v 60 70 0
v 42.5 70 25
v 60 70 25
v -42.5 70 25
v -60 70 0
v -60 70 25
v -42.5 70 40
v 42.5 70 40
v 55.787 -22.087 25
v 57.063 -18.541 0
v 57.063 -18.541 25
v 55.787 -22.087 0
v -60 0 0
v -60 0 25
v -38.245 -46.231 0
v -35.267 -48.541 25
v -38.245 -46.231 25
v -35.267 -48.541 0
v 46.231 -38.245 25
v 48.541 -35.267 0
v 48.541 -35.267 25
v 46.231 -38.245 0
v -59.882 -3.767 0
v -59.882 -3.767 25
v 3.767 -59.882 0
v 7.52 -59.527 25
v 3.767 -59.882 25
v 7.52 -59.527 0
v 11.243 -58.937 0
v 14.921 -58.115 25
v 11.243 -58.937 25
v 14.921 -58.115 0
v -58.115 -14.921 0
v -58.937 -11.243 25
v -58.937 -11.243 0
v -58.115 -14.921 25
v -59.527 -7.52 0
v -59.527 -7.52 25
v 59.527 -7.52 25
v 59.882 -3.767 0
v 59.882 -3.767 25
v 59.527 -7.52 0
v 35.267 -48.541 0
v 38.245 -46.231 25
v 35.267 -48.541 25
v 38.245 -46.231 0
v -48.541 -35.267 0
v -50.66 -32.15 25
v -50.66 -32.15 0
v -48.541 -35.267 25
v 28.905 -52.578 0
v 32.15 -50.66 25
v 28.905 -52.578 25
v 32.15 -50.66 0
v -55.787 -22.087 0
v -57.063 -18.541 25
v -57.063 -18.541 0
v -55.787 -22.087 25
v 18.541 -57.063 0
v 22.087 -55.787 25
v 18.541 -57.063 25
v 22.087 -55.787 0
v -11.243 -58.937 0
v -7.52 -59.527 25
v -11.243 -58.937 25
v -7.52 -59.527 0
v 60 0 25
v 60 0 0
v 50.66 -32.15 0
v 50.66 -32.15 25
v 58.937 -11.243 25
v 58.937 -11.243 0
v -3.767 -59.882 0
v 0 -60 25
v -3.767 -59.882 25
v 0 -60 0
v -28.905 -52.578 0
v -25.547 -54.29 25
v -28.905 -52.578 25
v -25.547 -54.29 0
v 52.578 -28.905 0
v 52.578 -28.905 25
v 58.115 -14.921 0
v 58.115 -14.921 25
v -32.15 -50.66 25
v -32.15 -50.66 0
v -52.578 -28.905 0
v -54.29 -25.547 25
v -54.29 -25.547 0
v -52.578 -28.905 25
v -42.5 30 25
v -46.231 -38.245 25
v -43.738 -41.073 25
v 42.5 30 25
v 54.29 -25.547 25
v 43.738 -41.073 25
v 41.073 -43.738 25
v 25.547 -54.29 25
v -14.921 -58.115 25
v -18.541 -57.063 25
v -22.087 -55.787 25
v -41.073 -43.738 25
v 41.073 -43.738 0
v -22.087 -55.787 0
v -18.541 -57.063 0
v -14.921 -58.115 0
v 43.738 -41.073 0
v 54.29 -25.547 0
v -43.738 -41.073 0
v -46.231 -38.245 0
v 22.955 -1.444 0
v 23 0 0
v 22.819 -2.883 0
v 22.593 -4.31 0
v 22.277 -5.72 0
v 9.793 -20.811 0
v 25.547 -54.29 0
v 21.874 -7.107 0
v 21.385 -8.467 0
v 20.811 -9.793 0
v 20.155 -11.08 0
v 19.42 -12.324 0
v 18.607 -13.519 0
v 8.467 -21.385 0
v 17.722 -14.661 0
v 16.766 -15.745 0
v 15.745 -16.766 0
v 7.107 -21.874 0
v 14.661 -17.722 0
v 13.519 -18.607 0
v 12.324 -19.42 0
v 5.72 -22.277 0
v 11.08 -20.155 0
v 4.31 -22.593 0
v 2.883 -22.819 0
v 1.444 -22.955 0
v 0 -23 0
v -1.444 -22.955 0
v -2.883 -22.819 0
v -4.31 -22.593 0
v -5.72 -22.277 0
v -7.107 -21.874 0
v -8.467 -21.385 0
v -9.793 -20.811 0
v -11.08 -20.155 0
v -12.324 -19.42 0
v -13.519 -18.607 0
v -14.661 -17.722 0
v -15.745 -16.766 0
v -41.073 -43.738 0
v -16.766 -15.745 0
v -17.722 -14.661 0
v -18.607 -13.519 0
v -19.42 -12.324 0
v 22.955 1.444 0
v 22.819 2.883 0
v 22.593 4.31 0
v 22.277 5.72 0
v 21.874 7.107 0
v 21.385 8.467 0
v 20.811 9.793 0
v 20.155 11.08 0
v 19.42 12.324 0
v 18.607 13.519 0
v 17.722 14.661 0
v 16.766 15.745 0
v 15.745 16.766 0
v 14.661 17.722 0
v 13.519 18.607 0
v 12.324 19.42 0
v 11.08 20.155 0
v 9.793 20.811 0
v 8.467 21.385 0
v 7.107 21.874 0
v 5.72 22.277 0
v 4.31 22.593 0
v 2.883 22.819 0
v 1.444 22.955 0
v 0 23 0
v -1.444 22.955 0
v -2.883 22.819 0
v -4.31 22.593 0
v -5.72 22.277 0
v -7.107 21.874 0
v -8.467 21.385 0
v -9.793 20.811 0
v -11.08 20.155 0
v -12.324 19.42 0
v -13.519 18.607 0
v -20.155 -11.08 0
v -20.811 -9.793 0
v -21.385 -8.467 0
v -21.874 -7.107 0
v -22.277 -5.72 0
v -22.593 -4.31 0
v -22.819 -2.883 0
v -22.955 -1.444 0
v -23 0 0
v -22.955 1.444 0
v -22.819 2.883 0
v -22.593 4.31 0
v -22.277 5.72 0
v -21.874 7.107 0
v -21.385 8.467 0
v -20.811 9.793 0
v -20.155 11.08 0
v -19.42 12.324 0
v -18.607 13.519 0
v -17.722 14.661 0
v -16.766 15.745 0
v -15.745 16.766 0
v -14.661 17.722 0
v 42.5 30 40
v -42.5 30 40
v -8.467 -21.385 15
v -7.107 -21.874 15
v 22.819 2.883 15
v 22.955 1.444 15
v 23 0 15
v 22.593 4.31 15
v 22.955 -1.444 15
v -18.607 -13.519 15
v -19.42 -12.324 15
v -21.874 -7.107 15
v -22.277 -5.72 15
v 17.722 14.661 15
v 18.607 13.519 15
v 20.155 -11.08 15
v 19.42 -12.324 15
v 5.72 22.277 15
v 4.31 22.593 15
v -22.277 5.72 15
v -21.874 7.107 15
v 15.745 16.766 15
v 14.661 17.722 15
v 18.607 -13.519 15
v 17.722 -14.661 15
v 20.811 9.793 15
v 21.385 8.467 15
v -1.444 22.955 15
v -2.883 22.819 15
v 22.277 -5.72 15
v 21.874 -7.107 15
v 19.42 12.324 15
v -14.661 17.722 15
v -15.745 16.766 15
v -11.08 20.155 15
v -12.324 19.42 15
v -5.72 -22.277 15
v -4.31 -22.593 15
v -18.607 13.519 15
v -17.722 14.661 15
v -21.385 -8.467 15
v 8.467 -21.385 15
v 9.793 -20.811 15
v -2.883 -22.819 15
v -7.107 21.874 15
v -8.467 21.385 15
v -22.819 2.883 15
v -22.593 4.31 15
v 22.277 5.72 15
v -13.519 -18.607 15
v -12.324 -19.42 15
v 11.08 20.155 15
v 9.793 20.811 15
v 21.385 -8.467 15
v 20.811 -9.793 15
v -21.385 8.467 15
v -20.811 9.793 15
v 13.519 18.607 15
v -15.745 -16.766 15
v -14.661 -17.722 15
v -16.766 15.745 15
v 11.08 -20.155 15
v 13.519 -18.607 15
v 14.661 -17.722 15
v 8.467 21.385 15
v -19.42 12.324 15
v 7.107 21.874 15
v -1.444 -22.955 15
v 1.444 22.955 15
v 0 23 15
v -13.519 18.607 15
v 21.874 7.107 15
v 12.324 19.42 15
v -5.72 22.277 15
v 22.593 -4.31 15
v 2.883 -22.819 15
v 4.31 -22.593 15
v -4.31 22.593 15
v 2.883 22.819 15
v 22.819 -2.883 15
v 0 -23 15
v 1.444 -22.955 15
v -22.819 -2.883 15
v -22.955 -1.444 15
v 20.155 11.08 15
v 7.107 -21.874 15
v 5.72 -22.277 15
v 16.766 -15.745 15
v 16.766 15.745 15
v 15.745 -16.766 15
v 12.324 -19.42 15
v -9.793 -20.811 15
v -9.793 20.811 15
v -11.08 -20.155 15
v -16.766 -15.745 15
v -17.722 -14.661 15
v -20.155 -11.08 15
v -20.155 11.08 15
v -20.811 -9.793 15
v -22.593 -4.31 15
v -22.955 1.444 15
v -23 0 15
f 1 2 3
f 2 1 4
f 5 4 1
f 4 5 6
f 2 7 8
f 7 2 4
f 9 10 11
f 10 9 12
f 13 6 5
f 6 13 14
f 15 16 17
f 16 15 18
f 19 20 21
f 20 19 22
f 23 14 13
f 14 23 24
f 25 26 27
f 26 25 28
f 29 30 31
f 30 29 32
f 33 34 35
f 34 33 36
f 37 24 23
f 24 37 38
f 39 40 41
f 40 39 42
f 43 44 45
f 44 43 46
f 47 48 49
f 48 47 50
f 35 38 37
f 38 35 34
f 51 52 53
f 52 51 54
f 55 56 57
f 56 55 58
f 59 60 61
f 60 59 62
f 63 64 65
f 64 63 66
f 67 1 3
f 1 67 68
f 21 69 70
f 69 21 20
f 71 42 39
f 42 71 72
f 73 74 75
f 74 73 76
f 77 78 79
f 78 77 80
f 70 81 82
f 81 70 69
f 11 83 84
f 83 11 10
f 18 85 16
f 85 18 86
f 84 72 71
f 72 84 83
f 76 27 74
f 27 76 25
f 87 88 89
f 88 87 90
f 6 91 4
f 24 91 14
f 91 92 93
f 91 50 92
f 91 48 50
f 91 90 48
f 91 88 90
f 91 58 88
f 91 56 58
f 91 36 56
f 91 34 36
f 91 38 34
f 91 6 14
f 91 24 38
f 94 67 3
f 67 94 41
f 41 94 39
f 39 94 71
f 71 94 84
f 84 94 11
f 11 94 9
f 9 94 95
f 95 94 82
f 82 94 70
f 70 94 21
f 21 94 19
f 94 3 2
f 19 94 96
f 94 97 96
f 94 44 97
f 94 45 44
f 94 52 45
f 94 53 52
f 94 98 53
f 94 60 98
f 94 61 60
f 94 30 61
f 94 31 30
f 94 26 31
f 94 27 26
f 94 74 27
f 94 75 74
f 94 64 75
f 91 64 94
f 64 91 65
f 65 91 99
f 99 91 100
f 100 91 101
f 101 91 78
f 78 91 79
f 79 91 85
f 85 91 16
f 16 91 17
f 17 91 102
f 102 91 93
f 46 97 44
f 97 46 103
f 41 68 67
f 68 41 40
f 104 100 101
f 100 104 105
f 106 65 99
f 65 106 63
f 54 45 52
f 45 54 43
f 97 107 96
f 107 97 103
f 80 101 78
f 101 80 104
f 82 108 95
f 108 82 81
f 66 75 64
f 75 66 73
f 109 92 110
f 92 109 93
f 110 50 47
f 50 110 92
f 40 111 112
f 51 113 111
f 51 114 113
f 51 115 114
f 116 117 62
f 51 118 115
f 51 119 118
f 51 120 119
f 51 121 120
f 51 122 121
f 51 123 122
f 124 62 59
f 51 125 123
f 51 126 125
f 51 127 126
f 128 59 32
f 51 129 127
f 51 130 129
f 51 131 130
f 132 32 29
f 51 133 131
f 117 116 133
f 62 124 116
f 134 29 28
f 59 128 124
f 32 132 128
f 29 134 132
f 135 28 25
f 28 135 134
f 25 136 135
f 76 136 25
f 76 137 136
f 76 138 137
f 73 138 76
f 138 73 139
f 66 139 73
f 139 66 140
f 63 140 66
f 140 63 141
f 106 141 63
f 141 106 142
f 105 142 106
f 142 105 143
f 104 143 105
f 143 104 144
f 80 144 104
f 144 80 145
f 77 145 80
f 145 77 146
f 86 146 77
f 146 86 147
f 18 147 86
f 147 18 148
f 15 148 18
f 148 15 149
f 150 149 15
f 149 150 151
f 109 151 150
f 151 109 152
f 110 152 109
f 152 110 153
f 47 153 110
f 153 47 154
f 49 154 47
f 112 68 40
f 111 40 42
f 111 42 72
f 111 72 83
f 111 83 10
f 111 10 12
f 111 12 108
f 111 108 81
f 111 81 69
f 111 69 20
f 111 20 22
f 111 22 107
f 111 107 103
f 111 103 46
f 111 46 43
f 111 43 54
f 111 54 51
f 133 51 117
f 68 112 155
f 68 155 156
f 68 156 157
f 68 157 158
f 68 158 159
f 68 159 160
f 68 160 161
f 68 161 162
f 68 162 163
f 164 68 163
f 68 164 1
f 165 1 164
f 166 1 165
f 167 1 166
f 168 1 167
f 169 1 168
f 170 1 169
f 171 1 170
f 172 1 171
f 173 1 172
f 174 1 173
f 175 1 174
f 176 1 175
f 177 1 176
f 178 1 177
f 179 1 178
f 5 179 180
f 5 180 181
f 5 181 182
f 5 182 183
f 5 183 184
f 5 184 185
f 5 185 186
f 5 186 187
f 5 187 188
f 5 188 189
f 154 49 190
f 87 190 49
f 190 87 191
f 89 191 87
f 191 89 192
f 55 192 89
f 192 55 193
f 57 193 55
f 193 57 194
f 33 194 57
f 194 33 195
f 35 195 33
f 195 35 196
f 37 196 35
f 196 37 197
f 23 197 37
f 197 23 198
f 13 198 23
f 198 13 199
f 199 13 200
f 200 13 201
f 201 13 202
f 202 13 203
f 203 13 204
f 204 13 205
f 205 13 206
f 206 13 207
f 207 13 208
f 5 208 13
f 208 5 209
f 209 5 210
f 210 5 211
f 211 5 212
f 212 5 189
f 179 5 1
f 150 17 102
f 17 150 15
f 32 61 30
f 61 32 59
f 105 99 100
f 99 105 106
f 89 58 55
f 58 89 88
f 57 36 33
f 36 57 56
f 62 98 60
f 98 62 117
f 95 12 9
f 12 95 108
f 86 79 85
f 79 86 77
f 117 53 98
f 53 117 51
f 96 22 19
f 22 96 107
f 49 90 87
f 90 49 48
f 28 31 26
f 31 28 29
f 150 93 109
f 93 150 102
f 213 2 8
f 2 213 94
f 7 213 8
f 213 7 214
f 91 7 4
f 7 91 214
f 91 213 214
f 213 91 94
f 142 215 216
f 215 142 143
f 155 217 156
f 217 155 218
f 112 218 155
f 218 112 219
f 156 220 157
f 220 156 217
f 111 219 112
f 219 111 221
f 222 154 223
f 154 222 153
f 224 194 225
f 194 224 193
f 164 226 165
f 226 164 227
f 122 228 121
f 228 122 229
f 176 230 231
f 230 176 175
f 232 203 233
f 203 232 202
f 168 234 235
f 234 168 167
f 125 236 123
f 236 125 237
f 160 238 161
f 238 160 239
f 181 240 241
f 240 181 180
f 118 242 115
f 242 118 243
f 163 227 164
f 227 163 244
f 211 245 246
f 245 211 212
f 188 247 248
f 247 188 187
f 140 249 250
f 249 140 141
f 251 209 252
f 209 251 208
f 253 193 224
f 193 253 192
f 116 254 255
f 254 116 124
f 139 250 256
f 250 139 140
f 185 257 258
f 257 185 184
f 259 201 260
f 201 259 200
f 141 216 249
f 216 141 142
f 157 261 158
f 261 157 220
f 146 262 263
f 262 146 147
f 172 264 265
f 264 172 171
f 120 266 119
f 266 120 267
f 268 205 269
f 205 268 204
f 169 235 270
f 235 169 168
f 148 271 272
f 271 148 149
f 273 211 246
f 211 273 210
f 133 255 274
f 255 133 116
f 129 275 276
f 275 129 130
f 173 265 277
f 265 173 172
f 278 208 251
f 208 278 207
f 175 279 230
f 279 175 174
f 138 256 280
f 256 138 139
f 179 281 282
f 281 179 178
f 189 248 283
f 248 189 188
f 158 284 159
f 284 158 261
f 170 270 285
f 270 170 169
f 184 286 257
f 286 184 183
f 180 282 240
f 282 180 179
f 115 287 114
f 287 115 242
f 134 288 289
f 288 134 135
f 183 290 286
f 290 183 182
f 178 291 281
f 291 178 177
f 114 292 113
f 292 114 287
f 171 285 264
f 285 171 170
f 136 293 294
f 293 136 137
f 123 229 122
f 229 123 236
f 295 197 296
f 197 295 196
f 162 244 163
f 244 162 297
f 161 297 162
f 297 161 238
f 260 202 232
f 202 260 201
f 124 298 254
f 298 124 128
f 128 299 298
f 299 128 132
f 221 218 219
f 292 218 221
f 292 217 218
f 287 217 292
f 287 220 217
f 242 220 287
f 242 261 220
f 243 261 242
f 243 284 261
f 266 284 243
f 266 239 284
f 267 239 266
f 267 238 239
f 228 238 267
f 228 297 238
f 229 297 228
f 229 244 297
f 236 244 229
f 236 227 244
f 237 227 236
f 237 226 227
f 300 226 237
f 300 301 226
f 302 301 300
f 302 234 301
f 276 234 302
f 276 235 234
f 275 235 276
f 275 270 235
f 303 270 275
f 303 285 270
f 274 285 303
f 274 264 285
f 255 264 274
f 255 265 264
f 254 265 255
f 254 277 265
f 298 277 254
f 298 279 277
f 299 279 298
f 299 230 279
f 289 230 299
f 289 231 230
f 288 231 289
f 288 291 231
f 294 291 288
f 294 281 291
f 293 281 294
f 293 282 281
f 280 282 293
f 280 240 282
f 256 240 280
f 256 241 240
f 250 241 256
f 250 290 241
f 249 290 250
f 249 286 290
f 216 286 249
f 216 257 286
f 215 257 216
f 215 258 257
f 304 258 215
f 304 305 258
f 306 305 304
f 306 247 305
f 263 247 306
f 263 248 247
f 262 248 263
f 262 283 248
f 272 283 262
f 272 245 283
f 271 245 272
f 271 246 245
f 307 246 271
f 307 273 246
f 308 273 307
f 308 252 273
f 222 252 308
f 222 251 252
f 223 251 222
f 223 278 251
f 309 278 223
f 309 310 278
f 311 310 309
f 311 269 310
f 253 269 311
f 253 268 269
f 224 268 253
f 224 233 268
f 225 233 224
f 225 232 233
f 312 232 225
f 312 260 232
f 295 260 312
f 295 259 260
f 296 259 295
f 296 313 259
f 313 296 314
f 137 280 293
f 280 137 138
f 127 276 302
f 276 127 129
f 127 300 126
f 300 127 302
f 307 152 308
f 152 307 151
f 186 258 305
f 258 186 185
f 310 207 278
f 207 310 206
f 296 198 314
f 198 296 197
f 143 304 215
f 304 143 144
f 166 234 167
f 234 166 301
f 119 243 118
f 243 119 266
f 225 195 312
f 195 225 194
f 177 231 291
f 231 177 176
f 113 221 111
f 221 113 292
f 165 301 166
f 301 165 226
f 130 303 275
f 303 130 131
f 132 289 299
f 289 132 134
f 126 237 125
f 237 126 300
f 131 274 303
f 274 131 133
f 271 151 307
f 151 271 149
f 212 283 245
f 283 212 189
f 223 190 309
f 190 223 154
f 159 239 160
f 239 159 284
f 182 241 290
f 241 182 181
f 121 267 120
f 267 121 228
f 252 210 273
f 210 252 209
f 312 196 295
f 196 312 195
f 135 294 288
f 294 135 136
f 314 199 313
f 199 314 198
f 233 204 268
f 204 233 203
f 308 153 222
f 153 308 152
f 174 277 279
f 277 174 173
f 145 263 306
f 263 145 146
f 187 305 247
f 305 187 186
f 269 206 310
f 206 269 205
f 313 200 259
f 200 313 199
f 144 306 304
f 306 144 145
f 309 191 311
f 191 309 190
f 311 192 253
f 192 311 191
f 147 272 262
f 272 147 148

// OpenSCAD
// EJEMPLOS BÁSICOS DE OPENSCAD 1 ( Raúl Florentin)
// Incluye: Piezas, operadores y transformaciones

// NOTA 1: se comenta una línea con: " // " , y un párrafo con:  /* . . . .*/.
//                Para ejecutar hay que sacar las " // " y " /.../ "en donde
//                corresponda.
// NOTA 2: Se previsualiza la pieza con F5
// NOTA 3: Se "Renderiza" con F6
// NOTA 4: Al final de cada pieza no olvidar el  " ; ", de lo contrario no
// previsualiza.
// NOTA 5: Usar como referencia la página:  https://openscad.org/cheatsheet/

// PIEZAS BASICAS:  (probar una línea a la vez borrando el " // ")
// cube( 10, center=false);
// cube([10,20,30], center=true);
// sphere(20 , $fn=100,   center=false);
// cylinder (h = 30, r=10, center = true, $fn=100);

// CENTRO FALSE o TRUE: (probar una línea a la vez)
// cube(10, center=false);
// cube(10, center=true);

// TRASLADO Y ROTACIONES: (probar  una línea a la vez)
// Recordar el center!
// cylinder (h = 10, r=10, center = true, $fn=100);
// translate([0,-10,0])   cylinder (h = 10, r=10, center = true, $fn=100);
// rotate([0,15,0])  cylinder (h = 10, r=10, center = true, $fn=100);
// translate([0,-10,0])  rotate([0,15,0])  cylinder (h = 10, r=10, center =
// true, $fn=100);

/*
//DIFFERENCE
//Ejemplos: Dos cilindros restados
difference() {
     cube(30, center=true);
     rotate([90,0,0]) cylinder (h=60, r=10, center=true, $fn=100);
}  */

/*
//UNION
//Ejemplos: Cubo restado con cilindro
union() {
      cube(30, center=true);
      rotate([90,0,0]) translate([0,0,0]) cylinder (h=60, r=10, center=true,
$fn=100);
}

*/

/*
//PARAMETRIZACION
altura=30;
diametro=10;
translate([-10,0,0]) cylinder(h=altura,r=diametro/2, center=true, $fn=100);
cylinder(50, 5, 0, center=true, $fn=100);
*/

/*
//MODULOS
//Ejemplos: Cube restado con cilindros

module catalina(lado, radio) {
  cube( lado*2, center=true);
  rotate([90,0,0])
  cylinder (h=lado*3, r=radio, center=true, $fn=100);
}

// Se debe invocar el módulo:
translate ([0,10,0]) catalina(15, 13);
*/

/*
// POLIGONOS (En sentido horario)
//Ejemplo 1: rectángulo
polygon(points=[
            [0,0],
            [10,0],
            [10,2],
            [0,2] ]
               );
*/

/*
//Ejemplo 2: triángulo
polygon(points=[
            [0,0],
            [10,0],
            [0,10], ]
               );
//NOTA: Se muestra una altura ficticia, (ver la verdadera altura con F6)
*/

/*
//EXTRUCCIÓN
//Ejemplo 1: Extrucción de un rectángulo con altura 20
linear_extrude (height=20, center=true )
polygon(points=[
            [0,0],
            [10,0],
            [10,2],
            [0,2] ]
               );
*/

// Ejemplo 2: Extrucción de un rectángulo con un giro de 360°
// linear_extrude (height=50, center=true  , twist = 360, slices=150)
// polygon(points=[
//             [0,0],
//             [10,0],
//             [10,2],
//             [0,2] ]
//                );

/*
//Ejemplo 3: Extrucción de un ciírculo trasladado en x=2
linear_extrude(height = 10, center = true, convexity = 10, twist = -500)
translate([2, 0, 0])
circle(r = 1, $fn=30);
*/

/*
//HULL: Crea tangentes entre cuerpos. ( =cáscara )
//Ejemplo 1: Cáscara entre dos cilindros distintos
hull () {
cylinder (h = 14, r=10, center = true, $fn=100);
translate([0,20,0])  cylinder (h = 10, r=5, center = true, $fn=100);
}
*/

/*
//Ejemplo 2: Cáscara entre un cubo y un cilindro trasladado en y=20
hull () {
cube (10,center = true, $fn=100);
translate([0,20,0])  cylinder (h = 10, r=5, center = true, $fn=100);
}
*/

/*
//Ejemplo 3: Cáscara entre un cubo y una esfera trasladada en y=20
hull () {
cube (10,center = true, $fn=100);
translate([0,10,0])  sphere(10 , $fn=100,   center=false);
}
*/

/*
//MINSCOWSKY: Para redondear aristas.
// Ejemplo 1: redondeo de un cube con una esfera
minkowski () {
  cube ([50,50,10]);
  sphere(4, $fn=50);
}
//NOTA: Minskowsky tiene un costo , hay que restarle el radio de la esfera a la
pieza


/*
//Ejemplo 2.: redondeo de un cube con cilindro
minkowski () {
  cube ([100,100,10]);
  cylinder (h = 1, r=10);
}
*/

// NOTA: como tarea, investigar como se podría visualizar las piezas por
// separado usando:  #

$fn = 100;
// Pieza base
R_base = 60;
H_base = 25;
L_base = 70;
W_base = 120;

// Pieza sup
W_sup = 85;
L_sup = 40;
H_sup = 15;

R_hc = 23;
// Hueco medio chico
H_hc = 15;

// Hueco medio grande
R_hg = 34;
H_hg = 25;

// Huecos pequeños
D_hp = 10;
H_hp = 40;
dist_hp = 50;

difference() {

  union() {

    hull() {
      cylinder(r = R_base, h = H_base);
      translate([ -R_base, R_base, 0 ])
          cube([ W_base, L_base - R_base, H_base ]);
    }

    translate([ -W_sup / 2, L_base - L_sup, H_base ])
        cube([ W_sup, L_sup, H_sup ]);
  }

  cylinder(r = R_hc, h = H_hc);
}
